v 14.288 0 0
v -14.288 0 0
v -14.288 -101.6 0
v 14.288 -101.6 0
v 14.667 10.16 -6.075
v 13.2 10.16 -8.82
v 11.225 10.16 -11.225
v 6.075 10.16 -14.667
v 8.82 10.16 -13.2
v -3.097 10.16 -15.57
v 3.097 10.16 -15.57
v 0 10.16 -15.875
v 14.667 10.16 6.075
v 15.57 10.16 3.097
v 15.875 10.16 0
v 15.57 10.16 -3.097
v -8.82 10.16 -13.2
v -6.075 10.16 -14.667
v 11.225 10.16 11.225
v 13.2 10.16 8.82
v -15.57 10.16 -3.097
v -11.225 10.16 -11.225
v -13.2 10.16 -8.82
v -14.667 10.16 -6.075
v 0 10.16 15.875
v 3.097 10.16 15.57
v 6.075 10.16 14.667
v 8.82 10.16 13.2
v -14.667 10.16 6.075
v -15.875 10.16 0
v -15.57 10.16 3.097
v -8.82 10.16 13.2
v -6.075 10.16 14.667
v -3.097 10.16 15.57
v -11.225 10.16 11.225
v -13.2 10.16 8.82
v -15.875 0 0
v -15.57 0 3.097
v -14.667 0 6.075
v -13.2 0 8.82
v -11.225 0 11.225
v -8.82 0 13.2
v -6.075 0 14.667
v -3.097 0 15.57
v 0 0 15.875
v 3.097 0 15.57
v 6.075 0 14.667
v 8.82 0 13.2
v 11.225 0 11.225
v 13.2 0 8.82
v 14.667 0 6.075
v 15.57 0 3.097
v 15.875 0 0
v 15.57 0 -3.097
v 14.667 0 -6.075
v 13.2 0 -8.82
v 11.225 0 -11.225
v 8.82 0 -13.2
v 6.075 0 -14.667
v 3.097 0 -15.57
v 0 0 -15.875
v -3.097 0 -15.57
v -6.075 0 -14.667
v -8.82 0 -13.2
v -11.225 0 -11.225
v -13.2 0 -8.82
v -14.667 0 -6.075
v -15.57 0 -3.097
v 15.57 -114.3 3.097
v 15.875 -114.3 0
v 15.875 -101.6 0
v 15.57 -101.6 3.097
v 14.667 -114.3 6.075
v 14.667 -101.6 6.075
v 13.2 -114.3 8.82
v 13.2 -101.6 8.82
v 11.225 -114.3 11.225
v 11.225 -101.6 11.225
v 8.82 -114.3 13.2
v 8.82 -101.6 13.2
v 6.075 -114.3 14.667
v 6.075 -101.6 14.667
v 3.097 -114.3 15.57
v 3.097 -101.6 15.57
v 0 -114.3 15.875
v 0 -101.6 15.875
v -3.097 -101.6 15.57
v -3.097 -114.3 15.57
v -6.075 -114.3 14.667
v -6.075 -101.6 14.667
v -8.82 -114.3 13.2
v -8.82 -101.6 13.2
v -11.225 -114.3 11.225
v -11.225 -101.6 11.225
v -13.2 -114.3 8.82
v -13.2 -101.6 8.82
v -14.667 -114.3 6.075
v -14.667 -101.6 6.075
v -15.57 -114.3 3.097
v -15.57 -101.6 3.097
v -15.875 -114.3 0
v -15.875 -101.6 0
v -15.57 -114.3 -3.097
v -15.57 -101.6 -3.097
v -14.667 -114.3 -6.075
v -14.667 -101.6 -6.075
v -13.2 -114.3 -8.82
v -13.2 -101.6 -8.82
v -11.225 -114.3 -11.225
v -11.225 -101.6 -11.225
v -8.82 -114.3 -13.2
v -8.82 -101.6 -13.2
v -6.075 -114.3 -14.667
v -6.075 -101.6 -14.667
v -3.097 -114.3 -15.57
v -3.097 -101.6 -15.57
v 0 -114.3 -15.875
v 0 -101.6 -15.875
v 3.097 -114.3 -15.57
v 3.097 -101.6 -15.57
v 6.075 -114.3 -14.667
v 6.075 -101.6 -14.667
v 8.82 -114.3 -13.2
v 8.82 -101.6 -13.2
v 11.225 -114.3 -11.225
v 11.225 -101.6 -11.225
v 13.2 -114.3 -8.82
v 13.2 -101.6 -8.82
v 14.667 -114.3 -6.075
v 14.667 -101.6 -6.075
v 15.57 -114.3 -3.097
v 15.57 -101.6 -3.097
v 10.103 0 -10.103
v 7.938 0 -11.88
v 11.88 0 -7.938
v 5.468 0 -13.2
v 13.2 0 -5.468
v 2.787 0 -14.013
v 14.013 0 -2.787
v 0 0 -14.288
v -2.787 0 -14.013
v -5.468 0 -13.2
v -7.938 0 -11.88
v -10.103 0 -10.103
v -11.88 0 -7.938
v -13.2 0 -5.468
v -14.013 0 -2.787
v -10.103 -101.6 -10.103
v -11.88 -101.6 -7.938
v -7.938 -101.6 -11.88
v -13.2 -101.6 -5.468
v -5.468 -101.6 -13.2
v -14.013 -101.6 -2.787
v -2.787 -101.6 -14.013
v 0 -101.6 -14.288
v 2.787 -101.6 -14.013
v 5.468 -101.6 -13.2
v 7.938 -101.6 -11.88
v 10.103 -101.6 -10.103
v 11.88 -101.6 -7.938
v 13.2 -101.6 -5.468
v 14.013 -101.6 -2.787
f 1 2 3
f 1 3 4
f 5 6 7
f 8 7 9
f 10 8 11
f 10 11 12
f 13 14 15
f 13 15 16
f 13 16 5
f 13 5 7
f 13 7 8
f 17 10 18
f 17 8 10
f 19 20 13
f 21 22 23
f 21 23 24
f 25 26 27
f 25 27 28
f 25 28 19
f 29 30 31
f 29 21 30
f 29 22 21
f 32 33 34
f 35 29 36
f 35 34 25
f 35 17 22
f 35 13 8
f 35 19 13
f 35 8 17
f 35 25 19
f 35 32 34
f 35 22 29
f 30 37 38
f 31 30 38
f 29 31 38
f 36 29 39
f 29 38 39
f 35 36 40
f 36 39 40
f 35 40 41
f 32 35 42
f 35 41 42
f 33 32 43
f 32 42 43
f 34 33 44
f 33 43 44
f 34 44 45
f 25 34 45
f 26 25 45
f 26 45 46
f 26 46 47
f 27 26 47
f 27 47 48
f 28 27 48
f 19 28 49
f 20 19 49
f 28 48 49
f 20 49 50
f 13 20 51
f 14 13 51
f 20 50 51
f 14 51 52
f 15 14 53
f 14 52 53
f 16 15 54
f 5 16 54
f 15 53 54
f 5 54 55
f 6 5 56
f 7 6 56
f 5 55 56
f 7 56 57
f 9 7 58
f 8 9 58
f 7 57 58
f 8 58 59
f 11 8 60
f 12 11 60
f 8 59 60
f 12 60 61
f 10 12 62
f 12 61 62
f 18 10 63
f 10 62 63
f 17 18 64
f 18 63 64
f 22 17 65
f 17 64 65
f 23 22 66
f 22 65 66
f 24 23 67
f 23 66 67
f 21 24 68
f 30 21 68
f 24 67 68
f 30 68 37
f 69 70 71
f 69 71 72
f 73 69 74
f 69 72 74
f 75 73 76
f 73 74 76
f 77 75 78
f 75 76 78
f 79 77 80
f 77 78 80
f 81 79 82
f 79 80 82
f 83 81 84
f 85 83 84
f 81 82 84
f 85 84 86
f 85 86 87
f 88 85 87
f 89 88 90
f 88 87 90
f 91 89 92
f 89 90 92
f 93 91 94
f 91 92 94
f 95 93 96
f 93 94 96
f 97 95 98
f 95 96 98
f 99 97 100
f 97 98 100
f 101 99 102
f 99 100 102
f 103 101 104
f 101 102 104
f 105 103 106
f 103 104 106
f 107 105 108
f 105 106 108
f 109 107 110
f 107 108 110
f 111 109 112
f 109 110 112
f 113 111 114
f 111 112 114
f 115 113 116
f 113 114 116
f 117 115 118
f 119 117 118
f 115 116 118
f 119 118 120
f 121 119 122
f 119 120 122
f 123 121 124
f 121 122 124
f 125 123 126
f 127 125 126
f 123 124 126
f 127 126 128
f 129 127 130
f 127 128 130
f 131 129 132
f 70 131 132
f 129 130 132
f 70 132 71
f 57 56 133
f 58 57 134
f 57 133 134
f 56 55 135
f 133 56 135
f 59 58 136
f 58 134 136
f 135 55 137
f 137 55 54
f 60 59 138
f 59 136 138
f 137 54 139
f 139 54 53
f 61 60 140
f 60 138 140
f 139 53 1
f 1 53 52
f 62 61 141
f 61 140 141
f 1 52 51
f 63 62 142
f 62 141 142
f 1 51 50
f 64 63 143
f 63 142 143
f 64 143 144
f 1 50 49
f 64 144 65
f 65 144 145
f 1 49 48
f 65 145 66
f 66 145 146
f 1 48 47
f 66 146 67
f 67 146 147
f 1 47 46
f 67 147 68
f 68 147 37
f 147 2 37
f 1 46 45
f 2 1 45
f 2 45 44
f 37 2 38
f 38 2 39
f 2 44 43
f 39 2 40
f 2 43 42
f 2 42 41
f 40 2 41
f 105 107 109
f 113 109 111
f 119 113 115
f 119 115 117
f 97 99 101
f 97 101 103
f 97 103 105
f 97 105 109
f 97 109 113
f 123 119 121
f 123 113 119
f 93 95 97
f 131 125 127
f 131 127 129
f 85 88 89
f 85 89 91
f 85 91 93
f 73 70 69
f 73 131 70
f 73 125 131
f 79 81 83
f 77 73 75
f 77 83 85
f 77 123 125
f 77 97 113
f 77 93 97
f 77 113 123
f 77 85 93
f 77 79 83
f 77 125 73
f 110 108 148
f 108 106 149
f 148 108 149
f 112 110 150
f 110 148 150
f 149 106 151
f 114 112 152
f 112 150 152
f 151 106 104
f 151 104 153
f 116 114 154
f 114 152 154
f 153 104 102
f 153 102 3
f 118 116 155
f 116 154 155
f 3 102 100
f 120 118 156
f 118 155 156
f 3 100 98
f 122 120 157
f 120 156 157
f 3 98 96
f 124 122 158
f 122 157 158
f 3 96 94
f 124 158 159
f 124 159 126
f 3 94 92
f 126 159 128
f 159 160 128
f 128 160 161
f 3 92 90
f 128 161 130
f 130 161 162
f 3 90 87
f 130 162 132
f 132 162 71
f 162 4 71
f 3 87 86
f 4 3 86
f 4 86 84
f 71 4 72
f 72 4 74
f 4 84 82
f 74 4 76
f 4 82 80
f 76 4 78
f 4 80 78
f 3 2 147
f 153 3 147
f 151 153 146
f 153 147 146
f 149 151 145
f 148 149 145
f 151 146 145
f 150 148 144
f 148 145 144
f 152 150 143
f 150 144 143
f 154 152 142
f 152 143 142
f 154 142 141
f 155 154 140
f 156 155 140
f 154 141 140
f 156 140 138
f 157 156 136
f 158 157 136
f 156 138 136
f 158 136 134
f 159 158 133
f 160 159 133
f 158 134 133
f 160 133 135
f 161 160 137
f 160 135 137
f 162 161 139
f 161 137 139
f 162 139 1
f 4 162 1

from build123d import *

# Parameters (mm, degrees)
F0_R     = 14.2875
F1_DEPTH = 101.6
F2_R     = 15.875
F3_DEPTH = 12.7
F4_R     = 15.875
F5_DEPTH = 10.16
F7_DEPTH = 101.6


with BuildPart() as f1:
    # F0 (on Front) → F1 (new body)
    with BuildSketch(Plane.XZ):
        Circle(F0_R)
    extrude(amount=F1_DEPTH)

    # F2 (on face) → F3 (join)
    with BuildSketch(Plane.XZ.offset(101.6)):
        Circle(F2_R)
    extrude(amount=F3_DEPTH)

    # F4 (on face) → F5 (join)
    with BuildSketch(Plane(origin=(0, 0, 0), x_dir=(-1, 0, 0), z_dir=(0, 1, 0))):
        Circle(F4_R)
    extrude(amount=F5_DEPTH)

    # F6 (on Front) → F7 (cut)
    with BuildSketch(Plane.XZ):
        with BuildLine():
            Line((-14.2875, 0), (0, 0))
            Line((0, 0), (14.2875, 0))
            ThreePointArc((14.2875, 0), (0, 14.2875), (-14.2875, 0))
        make_face()
    extrude(amount=F7_DEPTH, mode=Mode.SUBTRACT)


solid = f1.part
